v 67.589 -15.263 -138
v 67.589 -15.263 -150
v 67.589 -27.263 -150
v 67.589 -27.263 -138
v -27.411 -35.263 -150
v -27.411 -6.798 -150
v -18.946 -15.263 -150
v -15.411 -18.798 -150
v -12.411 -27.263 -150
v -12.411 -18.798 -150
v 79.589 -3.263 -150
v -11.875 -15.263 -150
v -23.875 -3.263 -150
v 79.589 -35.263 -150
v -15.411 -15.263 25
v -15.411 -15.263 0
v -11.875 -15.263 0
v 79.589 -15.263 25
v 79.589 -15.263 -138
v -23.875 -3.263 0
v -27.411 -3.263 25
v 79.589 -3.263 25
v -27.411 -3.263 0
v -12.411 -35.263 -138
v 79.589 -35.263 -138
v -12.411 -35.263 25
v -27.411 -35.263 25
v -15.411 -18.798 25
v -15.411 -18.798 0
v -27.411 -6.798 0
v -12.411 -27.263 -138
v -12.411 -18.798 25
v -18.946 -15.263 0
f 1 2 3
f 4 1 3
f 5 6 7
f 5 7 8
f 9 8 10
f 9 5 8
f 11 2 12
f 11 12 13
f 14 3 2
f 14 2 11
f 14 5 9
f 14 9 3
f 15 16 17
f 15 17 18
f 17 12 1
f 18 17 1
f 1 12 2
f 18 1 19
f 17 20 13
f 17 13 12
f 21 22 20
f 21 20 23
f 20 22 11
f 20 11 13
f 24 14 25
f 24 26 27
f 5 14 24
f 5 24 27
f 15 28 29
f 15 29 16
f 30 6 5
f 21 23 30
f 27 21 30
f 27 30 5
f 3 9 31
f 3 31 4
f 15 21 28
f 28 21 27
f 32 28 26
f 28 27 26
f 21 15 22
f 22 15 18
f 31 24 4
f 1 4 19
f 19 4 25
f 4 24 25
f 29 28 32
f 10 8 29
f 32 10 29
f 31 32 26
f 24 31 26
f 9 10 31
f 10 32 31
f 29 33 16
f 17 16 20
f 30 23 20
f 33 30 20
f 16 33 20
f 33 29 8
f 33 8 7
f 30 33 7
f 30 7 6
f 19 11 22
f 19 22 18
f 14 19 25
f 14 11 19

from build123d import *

# Parameters (mm, degrees)
F1_DEPTH = 25
F2_DEPTH = 150
F4_DEPTH = 175
F5_W     = 12
F5_H     = 8
F5_H_2   = 12
F6_DEPTH = 12


with BuildPart() as f1:
    # F0 (on Top) → F1 (new body)
    with BuildSketch(Plane.XY):
        Polygon((-15.4107665035, -11.7272357842), (-11.8752325976, -15.2627696901), (79.5892334965, -15.2627696901), (79.5892334965, -3.2627696901), (-15.4107665035, -3.2627696901), align=None)
        Polygon((-23.8752325976, -3.2627696901), (-15.4107665035, -11.7272357842), (-15.4107665035, -3.2627696901), align=None)
        Polygon((-18.9463004094, -15.2627696901), (-15.4107665035, -15.2627696901), (-27.4107665035, -3.2627696901), (-27.4107665035, -6.7983035961), align=None)
        Polygon((-27.4107665035, -15.2627696901), (-18.9463004094, -15.2627696901), (-27.4107665035, -6.7983035961), align=None)
        Polygon((-15.4107665035, -18.7983035961), (-18.9463004094, -15.2627696901), (-27.4107665035, -15.2627696901), (-27.4107665035, -35.2627696901), (-15.4107665035, -35.2627696901), align=None)
        Polygon((-27.4107665035, -3.2627696901), (-15.4107665035, -15.2627696901), (-15.4107665035, -11.7272357842), (-23.8752325976, -3.2627696901), align=None)
        Polygon((-15.4107665035, -11.7272357842), (-15.4107665035, -15.2627696901), (-11.8752325976, -15.2627696901), align=None)
        Polygon((-15.4107665035, -18.7983035961), (-15.4107665035, -15.2627696901), (-18.9463004094, -15.2627696901), align=None)
    extrude(amount=F1_DEPTH)

    # F0 (on Top) → F2 (join)
    with BuildSketch(Plane.XY):
        Polygon((-15.4107665035, -18.7983035961), (-18.9463004094, -15.2627696901), (-27.4107665035, -15.2627696901), (-27.4107665035, -35.2627696901), (-15.4107665035, -35.2627696901), align=None)
        Polygon((-23.8752325976, -3.2627696901), (-15.4107665035, -11.7272357842), (-15.4107665035, -3.2627696901), align=None)
        Polygon((-15.4107665035, -11.7272357842), (-11.8752325976, -15.2627696901), (79.5892334965, -15.2627696901), (79.5892334965, -3.2627696901), (-15.4107665035, -3.2627696901), align=None)
        Polygon((-27.4107665035, -15.2627696901), (-18.9463004094, -15.2627696901), (-27.4107665035, -6.7983035961), align=None)
    extrude(amount=-F2_DEPTH)

    # F3 (on face) → F4 (join, through all)
    with BuildSketch(Plane(origin=(0, 0, -150), x_dir=(1, 0, 0), z_dir=(0, 0, -1))):
        Polygon((-15.4107665035, 30.7983035961), (-15.4107665035, 18.7983035961), (-12.4107665035, 18.7983035961), (-12.4107665035, 30.7983035961), (-12.4107665035, 35.2627696901), (-15.4107665035, 35.2627696901), align=None)
    extrude(amount=-F4_DEPTH)

    # F5 (on face) → F6 (join)
    with BuildSketch(Plane(origin=(0, 0, -150), x_dir=(1, 0, 0), z_dir=(0, 0, -1))):
        Polygon((-12.4107665035, 35.2627696901), (-12.4107665035, 30.7983035961), (-12.4107665035, 27.2627696901), (67.5892334965, 27.2627696901), (67.5892334965, 35.2627696901), align=None)
        with Locations((73.5892334965, 31.2627696901)):
            Rectangle(F5_W, F5_H)
        with Locations((73.5892334965, 21.2627696901)):
            Rectangle(F5_W, F5_H_2)
        Polygon((79.5892334965, 15.2627696901), (67.5892334965, 15.2627696901), (-11.8752325976, 15.2627696901), (-23.8752325976, 3.2627696901), (79.5892334965, 3.2627696901), align=None)
    extrude(amount=-F6_DEPTH)


solid = f1.part
